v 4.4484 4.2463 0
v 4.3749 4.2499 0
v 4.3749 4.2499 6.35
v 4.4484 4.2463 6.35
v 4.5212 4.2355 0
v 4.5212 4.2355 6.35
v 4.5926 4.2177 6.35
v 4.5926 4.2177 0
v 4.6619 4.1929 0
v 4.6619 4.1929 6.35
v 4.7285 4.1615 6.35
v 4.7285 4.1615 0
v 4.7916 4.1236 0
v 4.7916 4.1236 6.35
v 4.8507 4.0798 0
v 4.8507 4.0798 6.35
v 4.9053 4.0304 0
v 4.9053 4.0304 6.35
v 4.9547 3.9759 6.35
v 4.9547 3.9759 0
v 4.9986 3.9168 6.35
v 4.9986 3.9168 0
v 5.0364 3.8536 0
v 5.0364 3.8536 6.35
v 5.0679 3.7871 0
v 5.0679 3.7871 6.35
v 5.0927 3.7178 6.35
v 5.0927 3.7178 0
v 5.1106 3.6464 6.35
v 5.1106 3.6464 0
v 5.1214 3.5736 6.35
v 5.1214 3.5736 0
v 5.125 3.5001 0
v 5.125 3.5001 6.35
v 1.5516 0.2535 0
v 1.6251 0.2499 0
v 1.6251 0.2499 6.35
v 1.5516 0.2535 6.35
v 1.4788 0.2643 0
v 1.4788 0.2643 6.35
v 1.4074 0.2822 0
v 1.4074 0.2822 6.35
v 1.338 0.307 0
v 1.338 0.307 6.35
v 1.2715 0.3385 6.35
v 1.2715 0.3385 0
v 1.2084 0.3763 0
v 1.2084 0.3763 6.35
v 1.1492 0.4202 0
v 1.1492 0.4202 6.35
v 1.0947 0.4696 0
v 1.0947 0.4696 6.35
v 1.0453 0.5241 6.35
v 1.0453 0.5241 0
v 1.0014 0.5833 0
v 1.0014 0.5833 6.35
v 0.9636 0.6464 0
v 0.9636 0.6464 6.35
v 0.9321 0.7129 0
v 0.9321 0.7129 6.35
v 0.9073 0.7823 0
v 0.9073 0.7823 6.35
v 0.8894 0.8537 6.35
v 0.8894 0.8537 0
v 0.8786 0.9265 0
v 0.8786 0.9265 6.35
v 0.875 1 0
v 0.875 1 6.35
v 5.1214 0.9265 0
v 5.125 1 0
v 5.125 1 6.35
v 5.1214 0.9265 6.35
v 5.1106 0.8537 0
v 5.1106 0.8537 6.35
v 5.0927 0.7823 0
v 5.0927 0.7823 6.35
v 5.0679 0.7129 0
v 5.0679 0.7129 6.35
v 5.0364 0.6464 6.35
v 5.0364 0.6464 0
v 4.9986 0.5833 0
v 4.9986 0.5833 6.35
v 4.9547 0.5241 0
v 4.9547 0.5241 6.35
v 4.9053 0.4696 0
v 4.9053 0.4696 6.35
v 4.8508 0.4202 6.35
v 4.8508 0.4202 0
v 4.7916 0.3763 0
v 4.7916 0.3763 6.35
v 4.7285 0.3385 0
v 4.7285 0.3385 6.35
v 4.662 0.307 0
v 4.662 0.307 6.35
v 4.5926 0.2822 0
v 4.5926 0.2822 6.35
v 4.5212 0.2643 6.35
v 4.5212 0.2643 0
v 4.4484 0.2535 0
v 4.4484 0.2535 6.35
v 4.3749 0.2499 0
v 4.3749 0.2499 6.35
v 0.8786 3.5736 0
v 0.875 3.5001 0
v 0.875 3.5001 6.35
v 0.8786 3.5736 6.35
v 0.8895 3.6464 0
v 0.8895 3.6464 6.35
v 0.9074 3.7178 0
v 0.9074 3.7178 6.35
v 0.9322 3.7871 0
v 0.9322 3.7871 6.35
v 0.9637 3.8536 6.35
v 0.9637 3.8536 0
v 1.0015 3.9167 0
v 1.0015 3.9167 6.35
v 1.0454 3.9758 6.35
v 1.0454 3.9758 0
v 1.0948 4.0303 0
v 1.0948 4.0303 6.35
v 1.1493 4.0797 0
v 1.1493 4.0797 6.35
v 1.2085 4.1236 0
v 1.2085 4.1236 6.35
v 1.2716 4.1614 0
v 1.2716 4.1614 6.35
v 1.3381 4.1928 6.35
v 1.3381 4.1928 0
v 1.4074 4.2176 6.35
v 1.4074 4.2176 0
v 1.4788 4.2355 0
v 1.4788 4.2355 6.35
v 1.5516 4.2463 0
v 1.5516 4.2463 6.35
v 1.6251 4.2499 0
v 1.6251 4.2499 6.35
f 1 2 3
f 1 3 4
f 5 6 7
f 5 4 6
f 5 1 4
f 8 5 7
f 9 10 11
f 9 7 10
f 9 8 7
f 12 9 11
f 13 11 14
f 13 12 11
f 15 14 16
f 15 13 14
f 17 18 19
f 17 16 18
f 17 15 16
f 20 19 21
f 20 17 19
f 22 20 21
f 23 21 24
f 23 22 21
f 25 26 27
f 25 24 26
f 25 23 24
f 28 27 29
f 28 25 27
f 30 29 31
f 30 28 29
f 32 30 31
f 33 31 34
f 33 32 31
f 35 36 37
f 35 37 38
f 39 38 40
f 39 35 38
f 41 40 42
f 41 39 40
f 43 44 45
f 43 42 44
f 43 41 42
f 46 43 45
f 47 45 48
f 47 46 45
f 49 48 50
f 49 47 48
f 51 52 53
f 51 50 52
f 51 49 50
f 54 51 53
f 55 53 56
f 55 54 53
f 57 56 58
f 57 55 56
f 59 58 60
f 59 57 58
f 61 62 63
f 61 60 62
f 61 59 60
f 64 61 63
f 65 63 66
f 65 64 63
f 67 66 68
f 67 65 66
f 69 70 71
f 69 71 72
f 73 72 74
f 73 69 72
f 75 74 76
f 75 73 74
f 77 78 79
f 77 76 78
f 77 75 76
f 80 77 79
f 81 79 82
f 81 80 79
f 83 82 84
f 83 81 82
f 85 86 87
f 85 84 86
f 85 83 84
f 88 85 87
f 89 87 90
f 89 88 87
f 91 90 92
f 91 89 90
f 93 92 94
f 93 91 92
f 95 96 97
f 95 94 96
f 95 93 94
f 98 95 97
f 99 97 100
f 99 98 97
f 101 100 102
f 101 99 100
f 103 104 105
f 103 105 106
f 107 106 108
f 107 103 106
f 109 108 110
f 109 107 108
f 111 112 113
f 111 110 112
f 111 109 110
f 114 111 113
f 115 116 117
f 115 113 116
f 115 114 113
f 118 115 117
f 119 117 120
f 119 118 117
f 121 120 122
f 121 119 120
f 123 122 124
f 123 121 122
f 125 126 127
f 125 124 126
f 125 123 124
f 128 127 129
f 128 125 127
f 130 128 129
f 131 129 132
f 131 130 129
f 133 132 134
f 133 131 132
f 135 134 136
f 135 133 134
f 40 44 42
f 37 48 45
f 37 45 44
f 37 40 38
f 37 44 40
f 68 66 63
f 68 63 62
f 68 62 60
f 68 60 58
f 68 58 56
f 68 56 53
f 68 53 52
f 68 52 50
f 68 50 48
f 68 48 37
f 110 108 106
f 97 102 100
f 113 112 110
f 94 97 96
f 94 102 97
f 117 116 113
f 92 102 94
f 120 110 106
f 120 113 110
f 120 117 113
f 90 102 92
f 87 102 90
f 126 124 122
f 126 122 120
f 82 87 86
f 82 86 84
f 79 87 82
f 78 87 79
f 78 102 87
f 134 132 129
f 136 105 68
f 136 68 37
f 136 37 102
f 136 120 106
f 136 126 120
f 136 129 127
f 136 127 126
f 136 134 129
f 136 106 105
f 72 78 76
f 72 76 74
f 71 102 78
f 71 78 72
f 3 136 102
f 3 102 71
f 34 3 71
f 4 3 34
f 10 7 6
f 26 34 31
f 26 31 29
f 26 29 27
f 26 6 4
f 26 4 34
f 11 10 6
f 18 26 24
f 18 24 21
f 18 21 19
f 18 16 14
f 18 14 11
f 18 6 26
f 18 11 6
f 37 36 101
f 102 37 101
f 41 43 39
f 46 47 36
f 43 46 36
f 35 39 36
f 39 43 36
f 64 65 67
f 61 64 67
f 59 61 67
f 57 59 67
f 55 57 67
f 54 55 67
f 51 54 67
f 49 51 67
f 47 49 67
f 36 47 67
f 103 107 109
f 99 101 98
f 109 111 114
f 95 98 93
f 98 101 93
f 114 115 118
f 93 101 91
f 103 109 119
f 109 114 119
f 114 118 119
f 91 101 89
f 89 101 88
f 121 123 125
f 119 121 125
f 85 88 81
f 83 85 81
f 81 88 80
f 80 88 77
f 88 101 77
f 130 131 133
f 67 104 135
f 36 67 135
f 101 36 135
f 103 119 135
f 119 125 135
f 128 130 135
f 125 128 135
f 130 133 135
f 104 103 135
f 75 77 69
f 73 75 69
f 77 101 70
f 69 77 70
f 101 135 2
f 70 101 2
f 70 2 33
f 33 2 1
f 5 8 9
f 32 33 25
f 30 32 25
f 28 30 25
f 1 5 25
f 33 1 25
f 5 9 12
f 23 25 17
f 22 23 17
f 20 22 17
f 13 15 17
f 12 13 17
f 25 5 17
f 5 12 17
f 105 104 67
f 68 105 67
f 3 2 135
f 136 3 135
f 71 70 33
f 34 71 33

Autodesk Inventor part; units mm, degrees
ref_plane "YZ Plane" through (0, 0, 0) normal (1, 0, 0) x (0, 1, 0)
ref_plane "XZ Plane" through (0, 0, 0) normal (0, 1, 0) x (-1, 0, 0)
ref_plane "XY Plane" through (0, 0, 0) normal (0, 0, 1) x (1, 0, 0)
sketch "FSM2JH, Pushbutton_60" plane through (0, 0, 0) normal (0, 0, 1) x (1, 0, 0)
  line L0 (1.6251, 0.2499) -> (4.3749, 0.2499)
  arc A0 (4.3749, 0.2499) -> (5.125, 1) centre (4.3749, 1) ccw
  line L1 (5.125, 1) -> (5.125, 3.5001)
  arc A1 (5.125, 3.5001) -> (4.3749, 4.2499) centre (4.375, 3.5) ccw
  line L2 (4.3749, 4.2499) -> (1.6251, 4.2499)
  arc A2 (1.6251, 4.2499) -> (0.875, 3.5001) centre (1.625, 3.5) ccw
  line L3 (0.875, 3.5001) -> (0.875, 1)
  arc A3 (0.875, 1) -> (1.6251, 0.2499) centre (1.6251, 1) ccw
extrude "Extrusion1" add sketch "FSM2JH, Pushbutton_60" along normal blind 6.35
properties part number "Pushbutton"
